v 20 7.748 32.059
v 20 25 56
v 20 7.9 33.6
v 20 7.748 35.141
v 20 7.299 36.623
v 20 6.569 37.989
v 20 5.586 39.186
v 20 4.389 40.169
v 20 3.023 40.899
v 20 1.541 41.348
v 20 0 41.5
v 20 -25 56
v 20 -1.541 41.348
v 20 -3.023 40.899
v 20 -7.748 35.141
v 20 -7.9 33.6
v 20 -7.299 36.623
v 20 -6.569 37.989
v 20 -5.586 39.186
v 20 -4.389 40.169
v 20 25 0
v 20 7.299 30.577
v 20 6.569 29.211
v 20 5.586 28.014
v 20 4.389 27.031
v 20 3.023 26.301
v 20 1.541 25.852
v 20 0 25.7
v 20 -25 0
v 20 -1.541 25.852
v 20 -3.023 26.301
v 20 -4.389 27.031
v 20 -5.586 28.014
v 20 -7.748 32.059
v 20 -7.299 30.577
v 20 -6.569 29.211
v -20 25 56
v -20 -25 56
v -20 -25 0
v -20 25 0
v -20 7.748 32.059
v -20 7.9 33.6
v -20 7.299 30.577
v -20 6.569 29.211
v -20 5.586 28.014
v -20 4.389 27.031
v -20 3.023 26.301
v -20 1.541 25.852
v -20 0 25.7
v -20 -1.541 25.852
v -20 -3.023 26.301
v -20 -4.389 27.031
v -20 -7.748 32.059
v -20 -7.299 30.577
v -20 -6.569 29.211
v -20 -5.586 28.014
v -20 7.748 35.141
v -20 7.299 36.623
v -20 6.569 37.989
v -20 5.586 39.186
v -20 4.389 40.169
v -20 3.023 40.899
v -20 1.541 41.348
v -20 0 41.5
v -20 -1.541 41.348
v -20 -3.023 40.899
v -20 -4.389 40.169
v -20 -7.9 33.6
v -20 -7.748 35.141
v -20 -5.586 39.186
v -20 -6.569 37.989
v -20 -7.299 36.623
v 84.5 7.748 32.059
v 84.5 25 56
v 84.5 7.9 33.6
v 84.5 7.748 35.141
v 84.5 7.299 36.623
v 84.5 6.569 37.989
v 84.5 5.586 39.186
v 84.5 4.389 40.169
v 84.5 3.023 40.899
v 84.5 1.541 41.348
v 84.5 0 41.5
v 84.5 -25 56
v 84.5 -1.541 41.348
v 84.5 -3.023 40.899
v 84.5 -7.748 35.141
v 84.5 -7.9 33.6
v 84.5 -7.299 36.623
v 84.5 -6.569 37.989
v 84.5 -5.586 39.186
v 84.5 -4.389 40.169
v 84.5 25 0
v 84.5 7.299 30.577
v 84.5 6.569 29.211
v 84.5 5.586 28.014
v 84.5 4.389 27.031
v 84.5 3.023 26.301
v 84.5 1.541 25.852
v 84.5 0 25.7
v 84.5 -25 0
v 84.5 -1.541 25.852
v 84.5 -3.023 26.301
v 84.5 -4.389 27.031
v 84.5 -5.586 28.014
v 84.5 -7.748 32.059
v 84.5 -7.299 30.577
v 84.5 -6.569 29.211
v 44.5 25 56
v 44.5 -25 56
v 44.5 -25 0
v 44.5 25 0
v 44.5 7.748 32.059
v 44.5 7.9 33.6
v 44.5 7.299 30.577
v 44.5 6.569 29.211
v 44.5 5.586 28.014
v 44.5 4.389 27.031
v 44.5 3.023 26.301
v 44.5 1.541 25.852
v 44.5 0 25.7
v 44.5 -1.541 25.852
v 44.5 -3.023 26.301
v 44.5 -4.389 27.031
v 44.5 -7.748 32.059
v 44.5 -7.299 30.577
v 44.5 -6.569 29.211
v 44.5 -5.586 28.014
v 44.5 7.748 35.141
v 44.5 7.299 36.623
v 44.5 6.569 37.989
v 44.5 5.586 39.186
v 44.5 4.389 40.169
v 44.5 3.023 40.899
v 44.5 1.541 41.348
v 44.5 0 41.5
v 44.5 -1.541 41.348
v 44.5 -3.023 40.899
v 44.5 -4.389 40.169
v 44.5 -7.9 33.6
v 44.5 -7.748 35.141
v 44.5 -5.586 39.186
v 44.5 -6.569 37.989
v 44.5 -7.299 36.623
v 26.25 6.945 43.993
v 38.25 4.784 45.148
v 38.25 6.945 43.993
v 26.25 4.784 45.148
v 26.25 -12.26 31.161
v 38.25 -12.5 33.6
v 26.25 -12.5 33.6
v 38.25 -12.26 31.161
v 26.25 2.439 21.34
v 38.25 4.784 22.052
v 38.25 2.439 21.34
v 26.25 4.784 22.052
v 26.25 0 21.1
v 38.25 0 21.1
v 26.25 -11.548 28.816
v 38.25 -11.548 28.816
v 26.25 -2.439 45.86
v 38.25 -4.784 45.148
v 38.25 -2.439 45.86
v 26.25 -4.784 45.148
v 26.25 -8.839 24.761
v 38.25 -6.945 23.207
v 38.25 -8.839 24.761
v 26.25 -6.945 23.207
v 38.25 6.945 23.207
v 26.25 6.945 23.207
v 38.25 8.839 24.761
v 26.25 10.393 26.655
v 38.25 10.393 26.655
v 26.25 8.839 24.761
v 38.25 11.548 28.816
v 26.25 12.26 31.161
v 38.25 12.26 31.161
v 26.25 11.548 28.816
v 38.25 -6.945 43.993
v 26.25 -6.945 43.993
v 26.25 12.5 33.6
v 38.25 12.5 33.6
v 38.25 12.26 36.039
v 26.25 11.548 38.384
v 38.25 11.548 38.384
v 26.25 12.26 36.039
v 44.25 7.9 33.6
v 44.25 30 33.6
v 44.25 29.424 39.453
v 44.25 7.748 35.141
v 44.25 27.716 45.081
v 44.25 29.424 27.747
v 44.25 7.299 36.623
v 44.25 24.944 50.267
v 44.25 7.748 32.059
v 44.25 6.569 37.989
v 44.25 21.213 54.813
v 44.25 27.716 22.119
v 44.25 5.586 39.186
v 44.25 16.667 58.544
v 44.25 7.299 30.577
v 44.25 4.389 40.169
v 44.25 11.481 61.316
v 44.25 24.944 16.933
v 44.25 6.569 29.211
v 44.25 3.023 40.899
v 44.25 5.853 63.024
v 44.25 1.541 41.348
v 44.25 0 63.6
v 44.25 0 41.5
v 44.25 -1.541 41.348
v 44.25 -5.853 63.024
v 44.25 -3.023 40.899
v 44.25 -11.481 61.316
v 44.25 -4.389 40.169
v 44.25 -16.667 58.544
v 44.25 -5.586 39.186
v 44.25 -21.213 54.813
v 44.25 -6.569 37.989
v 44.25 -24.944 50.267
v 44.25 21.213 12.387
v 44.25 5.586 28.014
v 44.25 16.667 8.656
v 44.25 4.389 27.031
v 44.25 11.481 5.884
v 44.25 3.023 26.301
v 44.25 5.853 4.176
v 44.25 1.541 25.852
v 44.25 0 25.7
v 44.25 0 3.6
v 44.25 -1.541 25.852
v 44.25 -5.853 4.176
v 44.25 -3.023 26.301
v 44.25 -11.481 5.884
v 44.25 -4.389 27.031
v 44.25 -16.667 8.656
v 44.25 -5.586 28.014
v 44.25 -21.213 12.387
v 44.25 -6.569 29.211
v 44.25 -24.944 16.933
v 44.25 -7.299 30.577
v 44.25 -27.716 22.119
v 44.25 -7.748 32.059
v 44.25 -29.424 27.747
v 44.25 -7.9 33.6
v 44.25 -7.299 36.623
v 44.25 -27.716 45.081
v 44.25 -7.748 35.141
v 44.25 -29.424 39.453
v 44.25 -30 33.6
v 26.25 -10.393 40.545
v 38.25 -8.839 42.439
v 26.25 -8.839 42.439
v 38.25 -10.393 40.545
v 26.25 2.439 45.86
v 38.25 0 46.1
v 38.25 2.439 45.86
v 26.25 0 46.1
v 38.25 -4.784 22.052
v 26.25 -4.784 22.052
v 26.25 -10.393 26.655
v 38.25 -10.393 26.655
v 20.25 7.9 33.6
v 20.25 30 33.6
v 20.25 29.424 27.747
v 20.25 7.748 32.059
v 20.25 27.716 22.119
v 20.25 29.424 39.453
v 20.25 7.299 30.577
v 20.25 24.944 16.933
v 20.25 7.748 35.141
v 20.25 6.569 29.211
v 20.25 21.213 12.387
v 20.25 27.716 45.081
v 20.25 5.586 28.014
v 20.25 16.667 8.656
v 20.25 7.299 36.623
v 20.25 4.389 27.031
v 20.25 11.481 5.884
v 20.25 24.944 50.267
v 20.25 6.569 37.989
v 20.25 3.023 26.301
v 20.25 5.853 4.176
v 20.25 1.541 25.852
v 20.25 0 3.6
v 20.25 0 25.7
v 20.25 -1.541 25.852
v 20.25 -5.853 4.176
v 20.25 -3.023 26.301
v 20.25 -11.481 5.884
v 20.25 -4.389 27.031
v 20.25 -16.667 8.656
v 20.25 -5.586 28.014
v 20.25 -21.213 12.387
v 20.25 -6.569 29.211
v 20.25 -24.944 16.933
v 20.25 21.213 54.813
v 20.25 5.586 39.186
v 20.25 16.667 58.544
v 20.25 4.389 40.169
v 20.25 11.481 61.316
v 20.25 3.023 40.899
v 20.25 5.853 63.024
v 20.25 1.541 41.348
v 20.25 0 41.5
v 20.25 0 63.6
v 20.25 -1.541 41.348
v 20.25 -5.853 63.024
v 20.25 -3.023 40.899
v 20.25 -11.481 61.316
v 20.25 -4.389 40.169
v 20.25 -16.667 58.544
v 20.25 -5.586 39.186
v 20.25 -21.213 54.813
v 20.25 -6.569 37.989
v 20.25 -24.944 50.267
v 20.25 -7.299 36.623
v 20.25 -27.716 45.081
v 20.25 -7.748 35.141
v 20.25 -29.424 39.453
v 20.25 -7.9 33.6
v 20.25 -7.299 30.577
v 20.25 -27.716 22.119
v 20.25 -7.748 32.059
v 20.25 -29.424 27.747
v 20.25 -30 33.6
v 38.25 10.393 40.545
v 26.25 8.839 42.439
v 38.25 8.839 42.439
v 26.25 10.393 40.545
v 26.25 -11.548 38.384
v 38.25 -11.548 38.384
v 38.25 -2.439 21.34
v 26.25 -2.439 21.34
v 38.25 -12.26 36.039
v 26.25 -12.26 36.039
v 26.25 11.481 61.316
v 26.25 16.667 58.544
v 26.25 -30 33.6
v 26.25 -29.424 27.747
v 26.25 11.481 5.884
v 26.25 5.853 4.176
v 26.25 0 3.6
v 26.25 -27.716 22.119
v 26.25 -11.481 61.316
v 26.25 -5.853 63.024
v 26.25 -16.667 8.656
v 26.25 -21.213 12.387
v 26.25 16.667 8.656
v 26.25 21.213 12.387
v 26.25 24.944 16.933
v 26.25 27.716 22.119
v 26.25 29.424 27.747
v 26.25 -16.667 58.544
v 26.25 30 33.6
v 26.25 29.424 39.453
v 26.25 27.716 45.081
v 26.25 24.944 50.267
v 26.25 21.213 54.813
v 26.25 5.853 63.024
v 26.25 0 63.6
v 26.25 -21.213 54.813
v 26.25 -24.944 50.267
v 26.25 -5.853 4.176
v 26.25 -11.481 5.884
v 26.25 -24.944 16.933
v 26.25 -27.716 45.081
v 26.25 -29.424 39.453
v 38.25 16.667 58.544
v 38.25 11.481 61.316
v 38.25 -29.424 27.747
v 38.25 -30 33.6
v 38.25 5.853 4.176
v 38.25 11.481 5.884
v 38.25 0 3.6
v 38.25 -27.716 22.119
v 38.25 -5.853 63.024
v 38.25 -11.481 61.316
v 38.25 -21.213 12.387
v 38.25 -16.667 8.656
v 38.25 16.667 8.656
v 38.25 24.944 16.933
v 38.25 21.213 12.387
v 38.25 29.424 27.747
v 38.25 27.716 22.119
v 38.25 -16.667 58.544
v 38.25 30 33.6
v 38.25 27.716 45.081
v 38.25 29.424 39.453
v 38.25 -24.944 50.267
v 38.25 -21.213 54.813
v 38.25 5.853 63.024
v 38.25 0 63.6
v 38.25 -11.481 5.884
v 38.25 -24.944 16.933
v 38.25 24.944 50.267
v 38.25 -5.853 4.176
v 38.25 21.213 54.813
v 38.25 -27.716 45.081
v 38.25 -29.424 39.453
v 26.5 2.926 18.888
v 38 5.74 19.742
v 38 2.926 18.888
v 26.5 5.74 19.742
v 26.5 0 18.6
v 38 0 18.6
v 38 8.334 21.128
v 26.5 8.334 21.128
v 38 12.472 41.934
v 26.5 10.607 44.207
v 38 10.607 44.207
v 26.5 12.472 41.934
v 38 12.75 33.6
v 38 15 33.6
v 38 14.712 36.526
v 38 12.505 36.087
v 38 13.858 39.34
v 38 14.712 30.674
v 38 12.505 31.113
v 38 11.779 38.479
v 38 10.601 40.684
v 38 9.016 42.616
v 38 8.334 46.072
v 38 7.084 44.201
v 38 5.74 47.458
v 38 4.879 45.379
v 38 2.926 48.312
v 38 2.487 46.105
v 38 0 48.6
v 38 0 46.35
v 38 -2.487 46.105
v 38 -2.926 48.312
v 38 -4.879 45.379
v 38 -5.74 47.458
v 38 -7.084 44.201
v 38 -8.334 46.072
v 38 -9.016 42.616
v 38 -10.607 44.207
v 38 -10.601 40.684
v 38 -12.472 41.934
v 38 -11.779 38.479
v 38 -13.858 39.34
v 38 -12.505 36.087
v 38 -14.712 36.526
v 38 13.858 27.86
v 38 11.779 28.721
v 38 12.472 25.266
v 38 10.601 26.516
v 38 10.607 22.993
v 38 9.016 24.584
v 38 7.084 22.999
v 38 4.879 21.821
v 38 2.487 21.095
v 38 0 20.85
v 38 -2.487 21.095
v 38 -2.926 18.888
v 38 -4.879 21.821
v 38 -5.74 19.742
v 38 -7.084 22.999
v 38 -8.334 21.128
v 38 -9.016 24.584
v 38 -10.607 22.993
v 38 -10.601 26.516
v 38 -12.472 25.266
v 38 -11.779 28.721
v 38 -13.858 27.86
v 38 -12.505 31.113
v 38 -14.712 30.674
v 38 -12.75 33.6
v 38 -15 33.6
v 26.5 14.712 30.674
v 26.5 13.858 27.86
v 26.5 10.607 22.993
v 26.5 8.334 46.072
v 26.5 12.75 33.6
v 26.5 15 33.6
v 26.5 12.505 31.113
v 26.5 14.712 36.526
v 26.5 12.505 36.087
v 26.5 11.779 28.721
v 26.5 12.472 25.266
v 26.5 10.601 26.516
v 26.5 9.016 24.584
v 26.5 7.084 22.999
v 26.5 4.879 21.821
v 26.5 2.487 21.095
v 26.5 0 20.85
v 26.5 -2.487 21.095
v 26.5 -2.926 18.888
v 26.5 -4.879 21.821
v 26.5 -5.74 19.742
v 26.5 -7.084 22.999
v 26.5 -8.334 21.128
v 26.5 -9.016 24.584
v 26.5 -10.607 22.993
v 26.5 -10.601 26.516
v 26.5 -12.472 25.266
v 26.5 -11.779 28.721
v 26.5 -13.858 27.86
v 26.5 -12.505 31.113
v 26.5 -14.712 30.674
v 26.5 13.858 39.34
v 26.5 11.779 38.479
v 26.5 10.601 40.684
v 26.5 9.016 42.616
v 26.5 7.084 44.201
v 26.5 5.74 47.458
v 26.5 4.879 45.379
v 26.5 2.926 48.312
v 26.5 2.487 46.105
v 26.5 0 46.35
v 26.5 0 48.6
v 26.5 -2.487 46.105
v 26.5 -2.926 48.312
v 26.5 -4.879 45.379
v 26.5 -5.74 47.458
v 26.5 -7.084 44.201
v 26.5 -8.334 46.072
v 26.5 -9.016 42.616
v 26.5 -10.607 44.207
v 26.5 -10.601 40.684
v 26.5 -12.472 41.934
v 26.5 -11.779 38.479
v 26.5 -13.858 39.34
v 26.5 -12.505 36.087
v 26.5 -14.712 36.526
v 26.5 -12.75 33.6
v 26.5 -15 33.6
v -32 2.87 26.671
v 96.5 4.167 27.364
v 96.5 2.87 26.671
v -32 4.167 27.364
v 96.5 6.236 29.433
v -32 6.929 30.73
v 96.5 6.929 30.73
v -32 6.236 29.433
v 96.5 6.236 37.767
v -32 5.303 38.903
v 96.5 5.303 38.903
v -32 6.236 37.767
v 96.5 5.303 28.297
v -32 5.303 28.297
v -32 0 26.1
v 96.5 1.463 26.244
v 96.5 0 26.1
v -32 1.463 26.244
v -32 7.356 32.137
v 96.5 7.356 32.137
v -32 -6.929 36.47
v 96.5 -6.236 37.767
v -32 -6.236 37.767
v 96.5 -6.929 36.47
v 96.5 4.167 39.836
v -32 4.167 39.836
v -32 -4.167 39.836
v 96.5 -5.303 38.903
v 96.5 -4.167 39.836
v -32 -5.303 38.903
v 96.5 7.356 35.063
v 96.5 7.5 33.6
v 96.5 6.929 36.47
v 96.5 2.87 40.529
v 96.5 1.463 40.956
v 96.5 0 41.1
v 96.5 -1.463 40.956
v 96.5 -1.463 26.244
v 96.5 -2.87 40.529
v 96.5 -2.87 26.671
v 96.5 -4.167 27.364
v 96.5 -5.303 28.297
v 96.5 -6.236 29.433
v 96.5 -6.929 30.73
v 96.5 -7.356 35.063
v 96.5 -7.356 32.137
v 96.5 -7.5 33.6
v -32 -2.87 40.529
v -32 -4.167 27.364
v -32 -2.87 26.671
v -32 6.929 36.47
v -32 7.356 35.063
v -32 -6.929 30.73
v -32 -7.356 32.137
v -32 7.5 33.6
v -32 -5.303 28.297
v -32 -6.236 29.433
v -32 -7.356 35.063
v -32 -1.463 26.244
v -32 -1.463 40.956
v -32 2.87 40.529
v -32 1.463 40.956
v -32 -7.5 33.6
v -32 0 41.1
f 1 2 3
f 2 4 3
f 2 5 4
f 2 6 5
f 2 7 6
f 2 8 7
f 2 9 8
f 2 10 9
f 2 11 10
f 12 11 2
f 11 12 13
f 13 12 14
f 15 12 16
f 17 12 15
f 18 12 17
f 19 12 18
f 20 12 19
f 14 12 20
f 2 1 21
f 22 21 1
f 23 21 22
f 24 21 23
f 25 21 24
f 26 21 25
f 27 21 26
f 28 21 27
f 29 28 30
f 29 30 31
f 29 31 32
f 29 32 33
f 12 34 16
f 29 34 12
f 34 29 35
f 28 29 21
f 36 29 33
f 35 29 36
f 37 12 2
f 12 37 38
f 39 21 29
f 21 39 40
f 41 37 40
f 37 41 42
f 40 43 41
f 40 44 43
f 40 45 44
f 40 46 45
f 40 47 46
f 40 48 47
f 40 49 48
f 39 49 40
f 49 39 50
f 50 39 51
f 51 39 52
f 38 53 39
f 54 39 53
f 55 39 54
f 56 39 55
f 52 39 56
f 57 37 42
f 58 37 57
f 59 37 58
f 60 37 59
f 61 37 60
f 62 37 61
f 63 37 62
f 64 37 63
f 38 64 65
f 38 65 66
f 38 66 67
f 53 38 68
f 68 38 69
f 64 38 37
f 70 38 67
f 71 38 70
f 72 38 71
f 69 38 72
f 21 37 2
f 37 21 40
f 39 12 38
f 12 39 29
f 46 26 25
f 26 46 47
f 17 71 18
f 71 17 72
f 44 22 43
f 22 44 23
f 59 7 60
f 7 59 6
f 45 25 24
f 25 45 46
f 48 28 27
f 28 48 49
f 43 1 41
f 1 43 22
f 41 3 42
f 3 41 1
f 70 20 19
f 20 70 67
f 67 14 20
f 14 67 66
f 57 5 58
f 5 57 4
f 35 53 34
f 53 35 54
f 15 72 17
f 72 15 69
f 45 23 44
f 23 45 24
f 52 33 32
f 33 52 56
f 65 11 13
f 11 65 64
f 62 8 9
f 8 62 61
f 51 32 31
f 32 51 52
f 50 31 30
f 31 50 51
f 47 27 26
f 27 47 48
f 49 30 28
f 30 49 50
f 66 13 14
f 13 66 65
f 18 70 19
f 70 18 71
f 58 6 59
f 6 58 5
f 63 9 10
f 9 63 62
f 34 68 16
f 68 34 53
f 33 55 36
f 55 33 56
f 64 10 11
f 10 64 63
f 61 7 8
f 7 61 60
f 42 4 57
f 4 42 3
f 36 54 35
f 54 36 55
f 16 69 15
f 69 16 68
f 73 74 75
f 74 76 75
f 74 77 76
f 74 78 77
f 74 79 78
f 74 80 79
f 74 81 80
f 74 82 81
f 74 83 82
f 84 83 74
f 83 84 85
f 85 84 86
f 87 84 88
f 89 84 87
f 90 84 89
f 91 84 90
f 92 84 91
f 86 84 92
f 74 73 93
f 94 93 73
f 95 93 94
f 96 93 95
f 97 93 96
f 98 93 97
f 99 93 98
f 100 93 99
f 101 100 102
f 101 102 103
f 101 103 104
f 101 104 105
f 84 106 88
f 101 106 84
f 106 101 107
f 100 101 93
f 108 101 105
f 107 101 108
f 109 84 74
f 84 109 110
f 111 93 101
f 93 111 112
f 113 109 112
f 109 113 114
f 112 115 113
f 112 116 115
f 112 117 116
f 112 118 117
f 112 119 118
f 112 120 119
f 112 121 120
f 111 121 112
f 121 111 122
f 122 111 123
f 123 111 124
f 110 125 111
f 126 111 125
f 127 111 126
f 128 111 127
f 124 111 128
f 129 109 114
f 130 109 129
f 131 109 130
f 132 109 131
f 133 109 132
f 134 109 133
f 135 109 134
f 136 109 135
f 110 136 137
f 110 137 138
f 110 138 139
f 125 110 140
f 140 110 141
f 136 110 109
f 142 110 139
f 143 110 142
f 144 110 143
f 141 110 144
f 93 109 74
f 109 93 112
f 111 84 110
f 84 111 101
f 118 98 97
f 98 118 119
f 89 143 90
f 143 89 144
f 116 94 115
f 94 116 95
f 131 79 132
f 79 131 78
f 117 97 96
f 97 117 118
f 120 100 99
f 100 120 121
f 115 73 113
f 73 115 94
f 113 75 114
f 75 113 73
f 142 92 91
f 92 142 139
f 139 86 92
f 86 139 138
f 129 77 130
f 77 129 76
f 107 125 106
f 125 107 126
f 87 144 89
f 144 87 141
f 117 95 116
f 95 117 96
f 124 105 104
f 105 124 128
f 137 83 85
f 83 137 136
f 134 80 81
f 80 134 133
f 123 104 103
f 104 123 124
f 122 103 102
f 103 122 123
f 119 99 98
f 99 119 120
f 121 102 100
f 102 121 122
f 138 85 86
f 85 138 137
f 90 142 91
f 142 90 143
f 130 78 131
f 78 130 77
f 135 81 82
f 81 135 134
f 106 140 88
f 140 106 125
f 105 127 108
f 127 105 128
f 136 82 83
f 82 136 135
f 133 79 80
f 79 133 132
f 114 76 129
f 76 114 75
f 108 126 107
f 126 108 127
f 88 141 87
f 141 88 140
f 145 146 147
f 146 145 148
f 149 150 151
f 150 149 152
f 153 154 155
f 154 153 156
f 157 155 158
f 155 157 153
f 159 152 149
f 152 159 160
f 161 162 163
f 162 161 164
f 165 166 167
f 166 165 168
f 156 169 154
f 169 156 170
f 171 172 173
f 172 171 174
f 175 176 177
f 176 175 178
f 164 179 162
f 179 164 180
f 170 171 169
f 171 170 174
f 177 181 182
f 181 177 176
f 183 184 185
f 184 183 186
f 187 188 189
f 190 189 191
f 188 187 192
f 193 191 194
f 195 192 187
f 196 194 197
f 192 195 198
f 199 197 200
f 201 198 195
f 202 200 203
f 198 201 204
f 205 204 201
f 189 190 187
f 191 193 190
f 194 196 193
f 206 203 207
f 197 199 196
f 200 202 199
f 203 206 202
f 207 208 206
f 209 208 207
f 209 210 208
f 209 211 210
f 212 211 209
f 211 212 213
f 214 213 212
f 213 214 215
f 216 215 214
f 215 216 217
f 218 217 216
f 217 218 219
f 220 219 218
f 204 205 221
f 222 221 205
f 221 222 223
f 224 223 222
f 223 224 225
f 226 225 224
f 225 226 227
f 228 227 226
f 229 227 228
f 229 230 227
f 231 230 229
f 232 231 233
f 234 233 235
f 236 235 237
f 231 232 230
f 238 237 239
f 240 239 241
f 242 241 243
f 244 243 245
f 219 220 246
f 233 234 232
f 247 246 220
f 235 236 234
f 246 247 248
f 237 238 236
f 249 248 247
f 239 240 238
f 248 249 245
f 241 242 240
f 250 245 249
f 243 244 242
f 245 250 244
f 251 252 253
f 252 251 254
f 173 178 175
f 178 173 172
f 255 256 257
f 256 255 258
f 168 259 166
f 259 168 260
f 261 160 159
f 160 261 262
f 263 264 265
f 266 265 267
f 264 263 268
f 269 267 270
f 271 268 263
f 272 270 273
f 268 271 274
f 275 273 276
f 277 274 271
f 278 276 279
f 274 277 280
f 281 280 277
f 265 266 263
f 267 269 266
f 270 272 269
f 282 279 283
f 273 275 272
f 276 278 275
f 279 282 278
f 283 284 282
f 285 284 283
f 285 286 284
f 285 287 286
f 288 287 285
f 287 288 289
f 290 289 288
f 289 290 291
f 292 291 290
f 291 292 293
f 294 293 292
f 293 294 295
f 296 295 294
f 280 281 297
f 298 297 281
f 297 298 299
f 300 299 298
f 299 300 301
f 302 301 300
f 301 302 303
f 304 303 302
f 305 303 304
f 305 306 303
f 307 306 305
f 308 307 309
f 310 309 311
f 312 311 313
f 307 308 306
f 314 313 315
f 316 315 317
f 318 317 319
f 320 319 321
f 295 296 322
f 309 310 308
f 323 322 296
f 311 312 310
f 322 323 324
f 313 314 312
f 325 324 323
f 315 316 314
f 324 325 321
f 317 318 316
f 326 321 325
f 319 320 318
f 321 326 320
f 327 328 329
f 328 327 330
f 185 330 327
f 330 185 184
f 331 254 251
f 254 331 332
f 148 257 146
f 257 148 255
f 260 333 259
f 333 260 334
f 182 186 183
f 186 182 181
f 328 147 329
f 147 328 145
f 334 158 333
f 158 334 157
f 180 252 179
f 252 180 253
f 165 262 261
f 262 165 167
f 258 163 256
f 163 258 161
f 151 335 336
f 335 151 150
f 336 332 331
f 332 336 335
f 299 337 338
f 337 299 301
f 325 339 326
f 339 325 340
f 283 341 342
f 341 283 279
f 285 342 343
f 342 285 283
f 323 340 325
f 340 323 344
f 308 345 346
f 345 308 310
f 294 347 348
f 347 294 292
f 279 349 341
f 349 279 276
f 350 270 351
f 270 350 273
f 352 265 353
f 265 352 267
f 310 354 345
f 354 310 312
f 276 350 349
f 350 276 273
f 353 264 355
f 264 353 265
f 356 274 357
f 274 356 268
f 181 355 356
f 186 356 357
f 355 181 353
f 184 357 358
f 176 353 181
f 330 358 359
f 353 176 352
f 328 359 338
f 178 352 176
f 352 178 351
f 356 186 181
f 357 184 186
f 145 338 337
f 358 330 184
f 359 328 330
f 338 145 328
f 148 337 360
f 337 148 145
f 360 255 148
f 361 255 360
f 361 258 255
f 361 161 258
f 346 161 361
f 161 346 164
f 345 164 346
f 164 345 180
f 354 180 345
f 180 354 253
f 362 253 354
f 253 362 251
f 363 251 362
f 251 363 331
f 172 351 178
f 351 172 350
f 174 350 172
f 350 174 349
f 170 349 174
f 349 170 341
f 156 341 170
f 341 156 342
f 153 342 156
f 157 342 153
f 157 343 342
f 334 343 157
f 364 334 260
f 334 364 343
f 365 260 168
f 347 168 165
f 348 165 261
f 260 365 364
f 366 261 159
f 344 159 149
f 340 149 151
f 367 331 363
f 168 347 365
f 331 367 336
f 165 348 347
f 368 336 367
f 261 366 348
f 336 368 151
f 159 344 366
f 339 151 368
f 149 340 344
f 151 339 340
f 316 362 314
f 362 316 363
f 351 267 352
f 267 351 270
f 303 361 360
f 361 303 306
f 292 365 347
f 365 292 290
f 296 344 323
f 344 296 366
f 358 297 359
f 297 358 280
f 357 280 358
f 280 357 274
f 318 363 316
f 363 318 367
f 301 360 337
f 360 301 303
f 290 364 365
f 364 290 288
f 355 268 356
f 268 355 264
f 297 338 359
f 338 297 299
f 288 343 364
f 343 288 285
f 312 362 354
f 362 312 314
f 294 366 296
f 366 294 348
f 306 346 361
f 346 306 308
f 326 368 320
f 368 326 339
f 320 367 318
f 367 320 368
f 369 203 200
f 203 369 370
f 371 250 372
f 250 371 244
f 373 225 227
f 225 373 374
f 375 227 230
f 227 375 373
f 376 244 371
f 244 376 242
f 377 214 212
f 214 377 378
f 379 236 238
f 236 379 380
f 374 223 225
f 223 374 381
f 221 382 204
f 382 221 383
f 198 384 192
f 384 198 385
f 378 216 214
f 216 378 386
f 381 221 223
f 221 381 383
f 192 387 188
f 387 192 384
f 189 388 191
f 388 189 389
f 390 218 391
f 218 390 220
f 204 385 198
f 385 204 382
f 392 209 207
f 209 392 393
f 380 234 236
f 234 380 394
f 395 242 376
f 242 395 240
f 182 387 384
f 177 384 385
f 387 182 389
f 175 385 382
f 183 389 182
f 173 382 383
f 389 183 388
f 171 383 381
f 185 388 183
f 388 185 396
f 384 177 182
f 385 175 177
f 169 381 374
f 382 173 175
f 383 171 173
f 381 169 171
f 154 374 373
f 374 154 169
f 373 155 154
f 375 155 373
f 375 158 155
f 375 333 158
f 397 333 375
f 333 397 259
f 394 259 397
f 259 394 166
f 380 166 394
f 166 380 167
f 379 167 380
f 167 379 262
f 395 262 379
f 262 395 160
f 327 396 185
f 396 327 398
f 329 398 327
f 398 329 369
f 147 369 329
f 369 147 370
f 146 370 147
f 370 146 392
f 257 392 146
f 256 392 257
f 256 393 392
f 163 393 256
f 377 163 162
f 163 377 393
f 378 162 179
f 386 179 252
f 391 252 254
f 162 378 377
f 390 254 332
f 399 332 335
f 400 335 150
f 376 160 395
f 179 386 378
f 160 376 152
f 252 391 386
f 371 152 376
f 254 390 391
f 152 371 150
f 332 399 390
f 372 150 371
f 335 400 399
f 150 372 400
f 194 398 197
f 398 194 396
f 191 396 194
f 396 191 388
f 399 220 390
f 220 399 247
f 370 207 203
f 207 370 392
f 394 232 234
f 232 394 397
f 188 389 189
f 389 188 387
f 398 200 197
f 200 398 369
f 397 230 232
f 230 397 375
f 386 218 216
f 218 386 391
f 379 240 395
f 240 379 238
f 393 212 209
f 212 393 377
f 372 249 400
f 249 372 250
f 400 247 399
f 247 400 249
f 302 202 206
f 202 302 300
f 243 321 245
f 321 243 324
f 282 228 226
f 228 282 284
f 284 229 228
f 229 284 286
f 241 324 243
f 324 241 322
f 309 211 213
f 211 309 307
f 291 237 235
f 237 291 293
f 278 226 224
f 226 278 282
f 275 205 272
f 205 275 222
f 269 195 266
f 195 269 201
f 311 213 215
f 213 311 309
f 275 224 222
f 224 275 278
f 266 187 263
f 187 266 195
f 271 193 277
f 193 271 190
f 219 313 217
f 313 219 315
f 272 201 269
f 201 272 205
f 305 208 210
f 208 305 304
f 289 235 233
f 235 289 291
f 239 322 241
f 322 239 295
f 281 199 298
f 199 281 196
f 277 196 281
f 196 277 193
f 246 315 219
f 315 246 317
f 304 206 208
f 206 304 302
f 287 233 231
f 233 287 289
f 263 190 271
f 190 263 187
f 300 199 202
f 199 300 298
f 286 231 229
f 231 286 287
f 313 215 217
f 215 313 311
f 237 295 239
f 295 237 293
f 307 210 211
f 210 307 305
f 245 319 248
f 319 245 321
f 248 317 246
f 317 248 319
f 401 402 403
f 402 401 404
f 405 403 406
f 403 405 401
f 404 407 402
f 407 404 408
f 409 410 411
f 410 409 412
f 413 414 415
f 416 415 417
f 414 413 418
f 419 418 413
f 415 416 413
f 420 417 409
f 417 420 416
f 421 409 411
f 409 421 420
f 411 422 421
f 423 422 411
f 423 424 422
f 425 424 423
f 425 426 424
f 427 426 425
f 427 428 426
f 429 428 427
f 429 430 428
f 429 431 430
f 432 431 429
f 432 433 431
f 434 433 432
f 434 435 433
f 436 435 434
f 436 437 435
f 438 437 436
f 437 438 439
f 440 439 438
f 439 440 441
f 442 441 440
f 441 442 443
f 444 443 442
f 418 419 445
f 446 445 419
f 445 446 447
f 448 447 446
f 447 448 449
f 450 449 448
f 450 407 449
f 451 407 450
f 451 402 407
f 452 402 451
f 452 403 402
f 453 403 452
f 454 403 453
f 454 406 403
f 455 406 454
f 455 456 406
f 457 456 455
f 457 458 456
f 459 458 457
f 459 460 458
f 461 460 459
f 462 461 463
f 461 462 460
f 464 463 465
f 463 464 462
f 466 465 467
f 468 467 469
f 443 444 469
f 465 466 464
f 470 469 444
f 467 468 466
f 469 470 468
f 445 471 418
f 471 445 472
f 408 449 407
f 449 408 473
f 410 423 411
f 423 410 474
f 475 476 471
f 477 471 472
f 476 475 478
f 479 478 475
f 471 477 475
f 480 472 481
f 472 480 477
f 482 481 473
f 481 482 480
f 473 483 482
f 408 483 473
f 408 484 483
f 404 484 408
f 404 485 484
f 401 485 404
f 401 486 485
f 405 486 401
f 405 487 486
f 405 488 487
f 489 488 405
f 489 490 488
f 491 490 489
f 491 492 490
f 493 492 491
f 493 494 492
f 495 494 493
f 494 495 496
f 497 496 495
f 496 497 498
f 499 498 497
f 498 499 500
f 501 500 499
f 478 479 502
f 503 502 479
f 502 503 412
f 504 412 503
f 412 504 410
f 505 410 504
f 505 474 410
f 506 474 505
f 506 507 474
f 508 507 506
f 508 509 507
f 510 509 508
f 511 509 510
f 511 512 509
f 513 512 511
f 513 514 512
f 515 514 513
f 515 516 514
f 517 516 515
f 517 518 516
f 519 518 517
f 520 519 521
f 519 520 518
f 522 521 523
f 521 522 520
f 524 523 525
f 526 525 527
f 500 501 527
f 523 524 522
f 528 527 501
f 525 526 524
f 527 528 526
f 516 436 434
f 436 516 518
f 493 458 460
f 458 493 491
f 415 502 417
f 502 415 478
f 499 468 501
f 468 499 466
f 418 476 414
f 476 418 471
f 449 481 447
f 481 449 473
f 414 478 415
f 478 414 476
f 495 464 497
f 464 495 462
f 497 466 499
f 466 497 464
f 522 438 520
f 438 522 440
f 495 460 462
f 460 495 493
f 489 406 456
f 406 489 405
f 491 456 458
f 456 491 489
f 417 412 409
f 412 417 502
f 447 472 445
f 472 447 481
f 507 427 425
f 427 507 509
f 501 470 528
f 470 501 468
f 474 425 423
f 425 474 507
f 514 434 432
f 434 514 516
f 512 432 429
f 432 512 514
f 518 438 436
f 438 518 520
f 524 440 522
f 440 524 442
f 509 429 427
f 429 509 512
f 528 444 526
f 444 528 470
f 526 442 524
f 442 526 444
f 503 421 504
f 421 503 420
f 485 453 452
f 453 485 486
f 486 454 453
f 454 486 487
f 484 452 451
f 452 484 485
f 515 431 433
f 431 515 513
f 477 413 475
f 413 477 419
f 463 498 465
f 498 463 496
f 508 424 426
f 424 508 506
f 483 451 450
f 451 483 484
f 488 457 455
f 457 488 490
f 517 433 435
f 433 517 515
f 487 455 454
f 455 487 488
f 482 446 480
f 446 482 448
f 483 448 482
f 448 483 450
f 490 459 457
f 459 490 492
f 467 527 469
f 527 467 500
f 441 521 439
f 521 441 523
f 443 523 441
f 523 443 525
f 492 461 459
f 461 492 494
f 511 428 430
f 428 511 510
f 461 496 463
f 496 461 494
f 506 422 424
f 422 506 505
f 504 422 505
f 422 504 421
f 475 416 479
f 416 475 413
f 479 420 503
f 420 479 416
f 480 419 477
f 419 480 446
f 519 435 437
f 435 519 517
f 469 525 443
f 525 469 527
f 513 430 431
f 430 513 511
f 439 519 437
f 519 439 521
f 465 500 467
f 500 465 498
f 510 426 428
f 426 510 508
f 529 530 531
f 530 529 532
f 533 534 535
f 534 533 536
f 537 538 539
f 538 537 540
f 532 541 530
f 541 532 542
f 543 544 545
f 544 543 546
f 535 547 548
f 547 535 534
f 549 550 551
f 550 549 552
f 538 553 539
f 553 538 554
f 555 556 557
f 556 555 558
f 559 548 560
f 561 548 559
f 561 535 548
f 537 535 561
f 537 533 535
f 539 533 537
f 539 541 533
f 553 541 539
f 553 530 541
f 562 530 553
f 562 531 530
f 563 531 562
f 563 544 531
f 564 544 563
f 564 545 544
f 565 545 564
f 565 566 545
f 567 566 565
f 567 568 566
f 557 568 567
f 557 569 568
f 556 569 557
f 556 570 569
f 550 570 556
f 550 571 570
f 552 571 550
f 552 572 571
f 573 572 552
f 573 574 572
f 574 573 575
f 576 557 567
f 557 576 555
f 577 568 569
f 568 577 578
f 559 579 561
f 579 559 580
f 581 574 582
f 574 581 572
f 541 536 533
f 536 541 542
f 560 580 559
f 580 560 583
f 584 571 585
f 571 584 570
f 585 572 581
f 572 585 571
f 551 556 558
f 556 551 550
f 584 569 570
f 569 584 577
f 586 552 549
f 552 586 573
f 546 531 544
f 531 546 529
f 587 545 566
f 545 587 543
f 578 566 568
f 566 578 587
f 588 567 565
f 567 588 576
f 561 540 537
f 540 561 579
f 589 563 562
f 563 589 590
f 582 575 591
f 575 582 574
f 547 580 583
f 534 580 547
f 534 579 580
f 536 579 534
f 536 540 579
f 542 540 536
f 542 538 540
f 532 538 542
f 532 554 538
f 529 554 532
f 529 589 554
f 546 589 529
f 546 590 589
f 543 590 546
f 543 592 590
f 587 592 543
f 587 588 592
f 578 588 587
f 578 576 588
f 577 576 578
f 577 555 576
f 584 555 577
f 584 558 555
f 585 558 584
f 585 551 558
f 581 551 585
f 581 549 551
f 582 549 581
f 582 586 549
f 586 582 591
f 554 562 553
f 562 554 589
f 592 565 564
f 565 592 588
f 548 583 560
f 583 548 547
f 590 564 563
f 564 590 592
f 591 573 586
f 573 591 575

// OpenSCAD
$fn = 32;

// ------------------------------------------------------------------------
// Pulley assembly: d60 pulley with a belt, shaft d15
// Every part is its own module, assembly() places them once.
// ------------------------------------------------------------------------

// --- part 1 ---
module support1() {
  difference() {
    translate([-20, -25, 0]) cube([40, 50, 56]);
    translate([0, 0, 33.6]) rotate([0, 90, 0]) cylinder(h = 42, d = 15.8, center = true);
  }
}

// --- part 2 ---
module support2() {
  difference() {
    translate([-20, -25, 0]) cube([40, 50, 56]);
    translate([0, 0, 33.6]) rotate([0, 90, 0]) cylinder(h = 42, d = 15.8, center = true);
  }
}

// --- part 3 ---
module shaft() {
  translate([0, 0, -64.25]) cylinder(h = 128.5, d = 15);
}

// --- part 4 ---
module pulley() {
  difference() {
    union() {
      cylinder(h = 24, d = 25);
      cylinder(h = 6, d = 60);
      translate([0, 0, 18]) cylinder(h = 6, d = 60);
    }
    translate([0, 0, -1]) cylinder(h = 26, d = 15.8);
  }
}

// --- part 5 ---
module belt() {
  difference() {
      translate([0, 0, 0]) cylinder(h = 11.5, d = 30);
      translate([0, 0, -1]) cylinder(h = 13.5, d = 25.5);
    }
}

// --- assembly ---
module assembly() {
  translate([0, 0, 0]) rotate([0, 0, 0]) support1();
  translate([64.5, 0, 0]) rotate([0, 0, 0]) support2();
  translate([32.25, 0, 33.6]) rotate([0, 90, 0]) shaft();
  translate([20.25, 0, 33.6]) rotate([0, 90, 0]) pulley();
  translate([26.5, 0, 33.6]) rotate([0, 90, 0]) belt();
}

assembly();
